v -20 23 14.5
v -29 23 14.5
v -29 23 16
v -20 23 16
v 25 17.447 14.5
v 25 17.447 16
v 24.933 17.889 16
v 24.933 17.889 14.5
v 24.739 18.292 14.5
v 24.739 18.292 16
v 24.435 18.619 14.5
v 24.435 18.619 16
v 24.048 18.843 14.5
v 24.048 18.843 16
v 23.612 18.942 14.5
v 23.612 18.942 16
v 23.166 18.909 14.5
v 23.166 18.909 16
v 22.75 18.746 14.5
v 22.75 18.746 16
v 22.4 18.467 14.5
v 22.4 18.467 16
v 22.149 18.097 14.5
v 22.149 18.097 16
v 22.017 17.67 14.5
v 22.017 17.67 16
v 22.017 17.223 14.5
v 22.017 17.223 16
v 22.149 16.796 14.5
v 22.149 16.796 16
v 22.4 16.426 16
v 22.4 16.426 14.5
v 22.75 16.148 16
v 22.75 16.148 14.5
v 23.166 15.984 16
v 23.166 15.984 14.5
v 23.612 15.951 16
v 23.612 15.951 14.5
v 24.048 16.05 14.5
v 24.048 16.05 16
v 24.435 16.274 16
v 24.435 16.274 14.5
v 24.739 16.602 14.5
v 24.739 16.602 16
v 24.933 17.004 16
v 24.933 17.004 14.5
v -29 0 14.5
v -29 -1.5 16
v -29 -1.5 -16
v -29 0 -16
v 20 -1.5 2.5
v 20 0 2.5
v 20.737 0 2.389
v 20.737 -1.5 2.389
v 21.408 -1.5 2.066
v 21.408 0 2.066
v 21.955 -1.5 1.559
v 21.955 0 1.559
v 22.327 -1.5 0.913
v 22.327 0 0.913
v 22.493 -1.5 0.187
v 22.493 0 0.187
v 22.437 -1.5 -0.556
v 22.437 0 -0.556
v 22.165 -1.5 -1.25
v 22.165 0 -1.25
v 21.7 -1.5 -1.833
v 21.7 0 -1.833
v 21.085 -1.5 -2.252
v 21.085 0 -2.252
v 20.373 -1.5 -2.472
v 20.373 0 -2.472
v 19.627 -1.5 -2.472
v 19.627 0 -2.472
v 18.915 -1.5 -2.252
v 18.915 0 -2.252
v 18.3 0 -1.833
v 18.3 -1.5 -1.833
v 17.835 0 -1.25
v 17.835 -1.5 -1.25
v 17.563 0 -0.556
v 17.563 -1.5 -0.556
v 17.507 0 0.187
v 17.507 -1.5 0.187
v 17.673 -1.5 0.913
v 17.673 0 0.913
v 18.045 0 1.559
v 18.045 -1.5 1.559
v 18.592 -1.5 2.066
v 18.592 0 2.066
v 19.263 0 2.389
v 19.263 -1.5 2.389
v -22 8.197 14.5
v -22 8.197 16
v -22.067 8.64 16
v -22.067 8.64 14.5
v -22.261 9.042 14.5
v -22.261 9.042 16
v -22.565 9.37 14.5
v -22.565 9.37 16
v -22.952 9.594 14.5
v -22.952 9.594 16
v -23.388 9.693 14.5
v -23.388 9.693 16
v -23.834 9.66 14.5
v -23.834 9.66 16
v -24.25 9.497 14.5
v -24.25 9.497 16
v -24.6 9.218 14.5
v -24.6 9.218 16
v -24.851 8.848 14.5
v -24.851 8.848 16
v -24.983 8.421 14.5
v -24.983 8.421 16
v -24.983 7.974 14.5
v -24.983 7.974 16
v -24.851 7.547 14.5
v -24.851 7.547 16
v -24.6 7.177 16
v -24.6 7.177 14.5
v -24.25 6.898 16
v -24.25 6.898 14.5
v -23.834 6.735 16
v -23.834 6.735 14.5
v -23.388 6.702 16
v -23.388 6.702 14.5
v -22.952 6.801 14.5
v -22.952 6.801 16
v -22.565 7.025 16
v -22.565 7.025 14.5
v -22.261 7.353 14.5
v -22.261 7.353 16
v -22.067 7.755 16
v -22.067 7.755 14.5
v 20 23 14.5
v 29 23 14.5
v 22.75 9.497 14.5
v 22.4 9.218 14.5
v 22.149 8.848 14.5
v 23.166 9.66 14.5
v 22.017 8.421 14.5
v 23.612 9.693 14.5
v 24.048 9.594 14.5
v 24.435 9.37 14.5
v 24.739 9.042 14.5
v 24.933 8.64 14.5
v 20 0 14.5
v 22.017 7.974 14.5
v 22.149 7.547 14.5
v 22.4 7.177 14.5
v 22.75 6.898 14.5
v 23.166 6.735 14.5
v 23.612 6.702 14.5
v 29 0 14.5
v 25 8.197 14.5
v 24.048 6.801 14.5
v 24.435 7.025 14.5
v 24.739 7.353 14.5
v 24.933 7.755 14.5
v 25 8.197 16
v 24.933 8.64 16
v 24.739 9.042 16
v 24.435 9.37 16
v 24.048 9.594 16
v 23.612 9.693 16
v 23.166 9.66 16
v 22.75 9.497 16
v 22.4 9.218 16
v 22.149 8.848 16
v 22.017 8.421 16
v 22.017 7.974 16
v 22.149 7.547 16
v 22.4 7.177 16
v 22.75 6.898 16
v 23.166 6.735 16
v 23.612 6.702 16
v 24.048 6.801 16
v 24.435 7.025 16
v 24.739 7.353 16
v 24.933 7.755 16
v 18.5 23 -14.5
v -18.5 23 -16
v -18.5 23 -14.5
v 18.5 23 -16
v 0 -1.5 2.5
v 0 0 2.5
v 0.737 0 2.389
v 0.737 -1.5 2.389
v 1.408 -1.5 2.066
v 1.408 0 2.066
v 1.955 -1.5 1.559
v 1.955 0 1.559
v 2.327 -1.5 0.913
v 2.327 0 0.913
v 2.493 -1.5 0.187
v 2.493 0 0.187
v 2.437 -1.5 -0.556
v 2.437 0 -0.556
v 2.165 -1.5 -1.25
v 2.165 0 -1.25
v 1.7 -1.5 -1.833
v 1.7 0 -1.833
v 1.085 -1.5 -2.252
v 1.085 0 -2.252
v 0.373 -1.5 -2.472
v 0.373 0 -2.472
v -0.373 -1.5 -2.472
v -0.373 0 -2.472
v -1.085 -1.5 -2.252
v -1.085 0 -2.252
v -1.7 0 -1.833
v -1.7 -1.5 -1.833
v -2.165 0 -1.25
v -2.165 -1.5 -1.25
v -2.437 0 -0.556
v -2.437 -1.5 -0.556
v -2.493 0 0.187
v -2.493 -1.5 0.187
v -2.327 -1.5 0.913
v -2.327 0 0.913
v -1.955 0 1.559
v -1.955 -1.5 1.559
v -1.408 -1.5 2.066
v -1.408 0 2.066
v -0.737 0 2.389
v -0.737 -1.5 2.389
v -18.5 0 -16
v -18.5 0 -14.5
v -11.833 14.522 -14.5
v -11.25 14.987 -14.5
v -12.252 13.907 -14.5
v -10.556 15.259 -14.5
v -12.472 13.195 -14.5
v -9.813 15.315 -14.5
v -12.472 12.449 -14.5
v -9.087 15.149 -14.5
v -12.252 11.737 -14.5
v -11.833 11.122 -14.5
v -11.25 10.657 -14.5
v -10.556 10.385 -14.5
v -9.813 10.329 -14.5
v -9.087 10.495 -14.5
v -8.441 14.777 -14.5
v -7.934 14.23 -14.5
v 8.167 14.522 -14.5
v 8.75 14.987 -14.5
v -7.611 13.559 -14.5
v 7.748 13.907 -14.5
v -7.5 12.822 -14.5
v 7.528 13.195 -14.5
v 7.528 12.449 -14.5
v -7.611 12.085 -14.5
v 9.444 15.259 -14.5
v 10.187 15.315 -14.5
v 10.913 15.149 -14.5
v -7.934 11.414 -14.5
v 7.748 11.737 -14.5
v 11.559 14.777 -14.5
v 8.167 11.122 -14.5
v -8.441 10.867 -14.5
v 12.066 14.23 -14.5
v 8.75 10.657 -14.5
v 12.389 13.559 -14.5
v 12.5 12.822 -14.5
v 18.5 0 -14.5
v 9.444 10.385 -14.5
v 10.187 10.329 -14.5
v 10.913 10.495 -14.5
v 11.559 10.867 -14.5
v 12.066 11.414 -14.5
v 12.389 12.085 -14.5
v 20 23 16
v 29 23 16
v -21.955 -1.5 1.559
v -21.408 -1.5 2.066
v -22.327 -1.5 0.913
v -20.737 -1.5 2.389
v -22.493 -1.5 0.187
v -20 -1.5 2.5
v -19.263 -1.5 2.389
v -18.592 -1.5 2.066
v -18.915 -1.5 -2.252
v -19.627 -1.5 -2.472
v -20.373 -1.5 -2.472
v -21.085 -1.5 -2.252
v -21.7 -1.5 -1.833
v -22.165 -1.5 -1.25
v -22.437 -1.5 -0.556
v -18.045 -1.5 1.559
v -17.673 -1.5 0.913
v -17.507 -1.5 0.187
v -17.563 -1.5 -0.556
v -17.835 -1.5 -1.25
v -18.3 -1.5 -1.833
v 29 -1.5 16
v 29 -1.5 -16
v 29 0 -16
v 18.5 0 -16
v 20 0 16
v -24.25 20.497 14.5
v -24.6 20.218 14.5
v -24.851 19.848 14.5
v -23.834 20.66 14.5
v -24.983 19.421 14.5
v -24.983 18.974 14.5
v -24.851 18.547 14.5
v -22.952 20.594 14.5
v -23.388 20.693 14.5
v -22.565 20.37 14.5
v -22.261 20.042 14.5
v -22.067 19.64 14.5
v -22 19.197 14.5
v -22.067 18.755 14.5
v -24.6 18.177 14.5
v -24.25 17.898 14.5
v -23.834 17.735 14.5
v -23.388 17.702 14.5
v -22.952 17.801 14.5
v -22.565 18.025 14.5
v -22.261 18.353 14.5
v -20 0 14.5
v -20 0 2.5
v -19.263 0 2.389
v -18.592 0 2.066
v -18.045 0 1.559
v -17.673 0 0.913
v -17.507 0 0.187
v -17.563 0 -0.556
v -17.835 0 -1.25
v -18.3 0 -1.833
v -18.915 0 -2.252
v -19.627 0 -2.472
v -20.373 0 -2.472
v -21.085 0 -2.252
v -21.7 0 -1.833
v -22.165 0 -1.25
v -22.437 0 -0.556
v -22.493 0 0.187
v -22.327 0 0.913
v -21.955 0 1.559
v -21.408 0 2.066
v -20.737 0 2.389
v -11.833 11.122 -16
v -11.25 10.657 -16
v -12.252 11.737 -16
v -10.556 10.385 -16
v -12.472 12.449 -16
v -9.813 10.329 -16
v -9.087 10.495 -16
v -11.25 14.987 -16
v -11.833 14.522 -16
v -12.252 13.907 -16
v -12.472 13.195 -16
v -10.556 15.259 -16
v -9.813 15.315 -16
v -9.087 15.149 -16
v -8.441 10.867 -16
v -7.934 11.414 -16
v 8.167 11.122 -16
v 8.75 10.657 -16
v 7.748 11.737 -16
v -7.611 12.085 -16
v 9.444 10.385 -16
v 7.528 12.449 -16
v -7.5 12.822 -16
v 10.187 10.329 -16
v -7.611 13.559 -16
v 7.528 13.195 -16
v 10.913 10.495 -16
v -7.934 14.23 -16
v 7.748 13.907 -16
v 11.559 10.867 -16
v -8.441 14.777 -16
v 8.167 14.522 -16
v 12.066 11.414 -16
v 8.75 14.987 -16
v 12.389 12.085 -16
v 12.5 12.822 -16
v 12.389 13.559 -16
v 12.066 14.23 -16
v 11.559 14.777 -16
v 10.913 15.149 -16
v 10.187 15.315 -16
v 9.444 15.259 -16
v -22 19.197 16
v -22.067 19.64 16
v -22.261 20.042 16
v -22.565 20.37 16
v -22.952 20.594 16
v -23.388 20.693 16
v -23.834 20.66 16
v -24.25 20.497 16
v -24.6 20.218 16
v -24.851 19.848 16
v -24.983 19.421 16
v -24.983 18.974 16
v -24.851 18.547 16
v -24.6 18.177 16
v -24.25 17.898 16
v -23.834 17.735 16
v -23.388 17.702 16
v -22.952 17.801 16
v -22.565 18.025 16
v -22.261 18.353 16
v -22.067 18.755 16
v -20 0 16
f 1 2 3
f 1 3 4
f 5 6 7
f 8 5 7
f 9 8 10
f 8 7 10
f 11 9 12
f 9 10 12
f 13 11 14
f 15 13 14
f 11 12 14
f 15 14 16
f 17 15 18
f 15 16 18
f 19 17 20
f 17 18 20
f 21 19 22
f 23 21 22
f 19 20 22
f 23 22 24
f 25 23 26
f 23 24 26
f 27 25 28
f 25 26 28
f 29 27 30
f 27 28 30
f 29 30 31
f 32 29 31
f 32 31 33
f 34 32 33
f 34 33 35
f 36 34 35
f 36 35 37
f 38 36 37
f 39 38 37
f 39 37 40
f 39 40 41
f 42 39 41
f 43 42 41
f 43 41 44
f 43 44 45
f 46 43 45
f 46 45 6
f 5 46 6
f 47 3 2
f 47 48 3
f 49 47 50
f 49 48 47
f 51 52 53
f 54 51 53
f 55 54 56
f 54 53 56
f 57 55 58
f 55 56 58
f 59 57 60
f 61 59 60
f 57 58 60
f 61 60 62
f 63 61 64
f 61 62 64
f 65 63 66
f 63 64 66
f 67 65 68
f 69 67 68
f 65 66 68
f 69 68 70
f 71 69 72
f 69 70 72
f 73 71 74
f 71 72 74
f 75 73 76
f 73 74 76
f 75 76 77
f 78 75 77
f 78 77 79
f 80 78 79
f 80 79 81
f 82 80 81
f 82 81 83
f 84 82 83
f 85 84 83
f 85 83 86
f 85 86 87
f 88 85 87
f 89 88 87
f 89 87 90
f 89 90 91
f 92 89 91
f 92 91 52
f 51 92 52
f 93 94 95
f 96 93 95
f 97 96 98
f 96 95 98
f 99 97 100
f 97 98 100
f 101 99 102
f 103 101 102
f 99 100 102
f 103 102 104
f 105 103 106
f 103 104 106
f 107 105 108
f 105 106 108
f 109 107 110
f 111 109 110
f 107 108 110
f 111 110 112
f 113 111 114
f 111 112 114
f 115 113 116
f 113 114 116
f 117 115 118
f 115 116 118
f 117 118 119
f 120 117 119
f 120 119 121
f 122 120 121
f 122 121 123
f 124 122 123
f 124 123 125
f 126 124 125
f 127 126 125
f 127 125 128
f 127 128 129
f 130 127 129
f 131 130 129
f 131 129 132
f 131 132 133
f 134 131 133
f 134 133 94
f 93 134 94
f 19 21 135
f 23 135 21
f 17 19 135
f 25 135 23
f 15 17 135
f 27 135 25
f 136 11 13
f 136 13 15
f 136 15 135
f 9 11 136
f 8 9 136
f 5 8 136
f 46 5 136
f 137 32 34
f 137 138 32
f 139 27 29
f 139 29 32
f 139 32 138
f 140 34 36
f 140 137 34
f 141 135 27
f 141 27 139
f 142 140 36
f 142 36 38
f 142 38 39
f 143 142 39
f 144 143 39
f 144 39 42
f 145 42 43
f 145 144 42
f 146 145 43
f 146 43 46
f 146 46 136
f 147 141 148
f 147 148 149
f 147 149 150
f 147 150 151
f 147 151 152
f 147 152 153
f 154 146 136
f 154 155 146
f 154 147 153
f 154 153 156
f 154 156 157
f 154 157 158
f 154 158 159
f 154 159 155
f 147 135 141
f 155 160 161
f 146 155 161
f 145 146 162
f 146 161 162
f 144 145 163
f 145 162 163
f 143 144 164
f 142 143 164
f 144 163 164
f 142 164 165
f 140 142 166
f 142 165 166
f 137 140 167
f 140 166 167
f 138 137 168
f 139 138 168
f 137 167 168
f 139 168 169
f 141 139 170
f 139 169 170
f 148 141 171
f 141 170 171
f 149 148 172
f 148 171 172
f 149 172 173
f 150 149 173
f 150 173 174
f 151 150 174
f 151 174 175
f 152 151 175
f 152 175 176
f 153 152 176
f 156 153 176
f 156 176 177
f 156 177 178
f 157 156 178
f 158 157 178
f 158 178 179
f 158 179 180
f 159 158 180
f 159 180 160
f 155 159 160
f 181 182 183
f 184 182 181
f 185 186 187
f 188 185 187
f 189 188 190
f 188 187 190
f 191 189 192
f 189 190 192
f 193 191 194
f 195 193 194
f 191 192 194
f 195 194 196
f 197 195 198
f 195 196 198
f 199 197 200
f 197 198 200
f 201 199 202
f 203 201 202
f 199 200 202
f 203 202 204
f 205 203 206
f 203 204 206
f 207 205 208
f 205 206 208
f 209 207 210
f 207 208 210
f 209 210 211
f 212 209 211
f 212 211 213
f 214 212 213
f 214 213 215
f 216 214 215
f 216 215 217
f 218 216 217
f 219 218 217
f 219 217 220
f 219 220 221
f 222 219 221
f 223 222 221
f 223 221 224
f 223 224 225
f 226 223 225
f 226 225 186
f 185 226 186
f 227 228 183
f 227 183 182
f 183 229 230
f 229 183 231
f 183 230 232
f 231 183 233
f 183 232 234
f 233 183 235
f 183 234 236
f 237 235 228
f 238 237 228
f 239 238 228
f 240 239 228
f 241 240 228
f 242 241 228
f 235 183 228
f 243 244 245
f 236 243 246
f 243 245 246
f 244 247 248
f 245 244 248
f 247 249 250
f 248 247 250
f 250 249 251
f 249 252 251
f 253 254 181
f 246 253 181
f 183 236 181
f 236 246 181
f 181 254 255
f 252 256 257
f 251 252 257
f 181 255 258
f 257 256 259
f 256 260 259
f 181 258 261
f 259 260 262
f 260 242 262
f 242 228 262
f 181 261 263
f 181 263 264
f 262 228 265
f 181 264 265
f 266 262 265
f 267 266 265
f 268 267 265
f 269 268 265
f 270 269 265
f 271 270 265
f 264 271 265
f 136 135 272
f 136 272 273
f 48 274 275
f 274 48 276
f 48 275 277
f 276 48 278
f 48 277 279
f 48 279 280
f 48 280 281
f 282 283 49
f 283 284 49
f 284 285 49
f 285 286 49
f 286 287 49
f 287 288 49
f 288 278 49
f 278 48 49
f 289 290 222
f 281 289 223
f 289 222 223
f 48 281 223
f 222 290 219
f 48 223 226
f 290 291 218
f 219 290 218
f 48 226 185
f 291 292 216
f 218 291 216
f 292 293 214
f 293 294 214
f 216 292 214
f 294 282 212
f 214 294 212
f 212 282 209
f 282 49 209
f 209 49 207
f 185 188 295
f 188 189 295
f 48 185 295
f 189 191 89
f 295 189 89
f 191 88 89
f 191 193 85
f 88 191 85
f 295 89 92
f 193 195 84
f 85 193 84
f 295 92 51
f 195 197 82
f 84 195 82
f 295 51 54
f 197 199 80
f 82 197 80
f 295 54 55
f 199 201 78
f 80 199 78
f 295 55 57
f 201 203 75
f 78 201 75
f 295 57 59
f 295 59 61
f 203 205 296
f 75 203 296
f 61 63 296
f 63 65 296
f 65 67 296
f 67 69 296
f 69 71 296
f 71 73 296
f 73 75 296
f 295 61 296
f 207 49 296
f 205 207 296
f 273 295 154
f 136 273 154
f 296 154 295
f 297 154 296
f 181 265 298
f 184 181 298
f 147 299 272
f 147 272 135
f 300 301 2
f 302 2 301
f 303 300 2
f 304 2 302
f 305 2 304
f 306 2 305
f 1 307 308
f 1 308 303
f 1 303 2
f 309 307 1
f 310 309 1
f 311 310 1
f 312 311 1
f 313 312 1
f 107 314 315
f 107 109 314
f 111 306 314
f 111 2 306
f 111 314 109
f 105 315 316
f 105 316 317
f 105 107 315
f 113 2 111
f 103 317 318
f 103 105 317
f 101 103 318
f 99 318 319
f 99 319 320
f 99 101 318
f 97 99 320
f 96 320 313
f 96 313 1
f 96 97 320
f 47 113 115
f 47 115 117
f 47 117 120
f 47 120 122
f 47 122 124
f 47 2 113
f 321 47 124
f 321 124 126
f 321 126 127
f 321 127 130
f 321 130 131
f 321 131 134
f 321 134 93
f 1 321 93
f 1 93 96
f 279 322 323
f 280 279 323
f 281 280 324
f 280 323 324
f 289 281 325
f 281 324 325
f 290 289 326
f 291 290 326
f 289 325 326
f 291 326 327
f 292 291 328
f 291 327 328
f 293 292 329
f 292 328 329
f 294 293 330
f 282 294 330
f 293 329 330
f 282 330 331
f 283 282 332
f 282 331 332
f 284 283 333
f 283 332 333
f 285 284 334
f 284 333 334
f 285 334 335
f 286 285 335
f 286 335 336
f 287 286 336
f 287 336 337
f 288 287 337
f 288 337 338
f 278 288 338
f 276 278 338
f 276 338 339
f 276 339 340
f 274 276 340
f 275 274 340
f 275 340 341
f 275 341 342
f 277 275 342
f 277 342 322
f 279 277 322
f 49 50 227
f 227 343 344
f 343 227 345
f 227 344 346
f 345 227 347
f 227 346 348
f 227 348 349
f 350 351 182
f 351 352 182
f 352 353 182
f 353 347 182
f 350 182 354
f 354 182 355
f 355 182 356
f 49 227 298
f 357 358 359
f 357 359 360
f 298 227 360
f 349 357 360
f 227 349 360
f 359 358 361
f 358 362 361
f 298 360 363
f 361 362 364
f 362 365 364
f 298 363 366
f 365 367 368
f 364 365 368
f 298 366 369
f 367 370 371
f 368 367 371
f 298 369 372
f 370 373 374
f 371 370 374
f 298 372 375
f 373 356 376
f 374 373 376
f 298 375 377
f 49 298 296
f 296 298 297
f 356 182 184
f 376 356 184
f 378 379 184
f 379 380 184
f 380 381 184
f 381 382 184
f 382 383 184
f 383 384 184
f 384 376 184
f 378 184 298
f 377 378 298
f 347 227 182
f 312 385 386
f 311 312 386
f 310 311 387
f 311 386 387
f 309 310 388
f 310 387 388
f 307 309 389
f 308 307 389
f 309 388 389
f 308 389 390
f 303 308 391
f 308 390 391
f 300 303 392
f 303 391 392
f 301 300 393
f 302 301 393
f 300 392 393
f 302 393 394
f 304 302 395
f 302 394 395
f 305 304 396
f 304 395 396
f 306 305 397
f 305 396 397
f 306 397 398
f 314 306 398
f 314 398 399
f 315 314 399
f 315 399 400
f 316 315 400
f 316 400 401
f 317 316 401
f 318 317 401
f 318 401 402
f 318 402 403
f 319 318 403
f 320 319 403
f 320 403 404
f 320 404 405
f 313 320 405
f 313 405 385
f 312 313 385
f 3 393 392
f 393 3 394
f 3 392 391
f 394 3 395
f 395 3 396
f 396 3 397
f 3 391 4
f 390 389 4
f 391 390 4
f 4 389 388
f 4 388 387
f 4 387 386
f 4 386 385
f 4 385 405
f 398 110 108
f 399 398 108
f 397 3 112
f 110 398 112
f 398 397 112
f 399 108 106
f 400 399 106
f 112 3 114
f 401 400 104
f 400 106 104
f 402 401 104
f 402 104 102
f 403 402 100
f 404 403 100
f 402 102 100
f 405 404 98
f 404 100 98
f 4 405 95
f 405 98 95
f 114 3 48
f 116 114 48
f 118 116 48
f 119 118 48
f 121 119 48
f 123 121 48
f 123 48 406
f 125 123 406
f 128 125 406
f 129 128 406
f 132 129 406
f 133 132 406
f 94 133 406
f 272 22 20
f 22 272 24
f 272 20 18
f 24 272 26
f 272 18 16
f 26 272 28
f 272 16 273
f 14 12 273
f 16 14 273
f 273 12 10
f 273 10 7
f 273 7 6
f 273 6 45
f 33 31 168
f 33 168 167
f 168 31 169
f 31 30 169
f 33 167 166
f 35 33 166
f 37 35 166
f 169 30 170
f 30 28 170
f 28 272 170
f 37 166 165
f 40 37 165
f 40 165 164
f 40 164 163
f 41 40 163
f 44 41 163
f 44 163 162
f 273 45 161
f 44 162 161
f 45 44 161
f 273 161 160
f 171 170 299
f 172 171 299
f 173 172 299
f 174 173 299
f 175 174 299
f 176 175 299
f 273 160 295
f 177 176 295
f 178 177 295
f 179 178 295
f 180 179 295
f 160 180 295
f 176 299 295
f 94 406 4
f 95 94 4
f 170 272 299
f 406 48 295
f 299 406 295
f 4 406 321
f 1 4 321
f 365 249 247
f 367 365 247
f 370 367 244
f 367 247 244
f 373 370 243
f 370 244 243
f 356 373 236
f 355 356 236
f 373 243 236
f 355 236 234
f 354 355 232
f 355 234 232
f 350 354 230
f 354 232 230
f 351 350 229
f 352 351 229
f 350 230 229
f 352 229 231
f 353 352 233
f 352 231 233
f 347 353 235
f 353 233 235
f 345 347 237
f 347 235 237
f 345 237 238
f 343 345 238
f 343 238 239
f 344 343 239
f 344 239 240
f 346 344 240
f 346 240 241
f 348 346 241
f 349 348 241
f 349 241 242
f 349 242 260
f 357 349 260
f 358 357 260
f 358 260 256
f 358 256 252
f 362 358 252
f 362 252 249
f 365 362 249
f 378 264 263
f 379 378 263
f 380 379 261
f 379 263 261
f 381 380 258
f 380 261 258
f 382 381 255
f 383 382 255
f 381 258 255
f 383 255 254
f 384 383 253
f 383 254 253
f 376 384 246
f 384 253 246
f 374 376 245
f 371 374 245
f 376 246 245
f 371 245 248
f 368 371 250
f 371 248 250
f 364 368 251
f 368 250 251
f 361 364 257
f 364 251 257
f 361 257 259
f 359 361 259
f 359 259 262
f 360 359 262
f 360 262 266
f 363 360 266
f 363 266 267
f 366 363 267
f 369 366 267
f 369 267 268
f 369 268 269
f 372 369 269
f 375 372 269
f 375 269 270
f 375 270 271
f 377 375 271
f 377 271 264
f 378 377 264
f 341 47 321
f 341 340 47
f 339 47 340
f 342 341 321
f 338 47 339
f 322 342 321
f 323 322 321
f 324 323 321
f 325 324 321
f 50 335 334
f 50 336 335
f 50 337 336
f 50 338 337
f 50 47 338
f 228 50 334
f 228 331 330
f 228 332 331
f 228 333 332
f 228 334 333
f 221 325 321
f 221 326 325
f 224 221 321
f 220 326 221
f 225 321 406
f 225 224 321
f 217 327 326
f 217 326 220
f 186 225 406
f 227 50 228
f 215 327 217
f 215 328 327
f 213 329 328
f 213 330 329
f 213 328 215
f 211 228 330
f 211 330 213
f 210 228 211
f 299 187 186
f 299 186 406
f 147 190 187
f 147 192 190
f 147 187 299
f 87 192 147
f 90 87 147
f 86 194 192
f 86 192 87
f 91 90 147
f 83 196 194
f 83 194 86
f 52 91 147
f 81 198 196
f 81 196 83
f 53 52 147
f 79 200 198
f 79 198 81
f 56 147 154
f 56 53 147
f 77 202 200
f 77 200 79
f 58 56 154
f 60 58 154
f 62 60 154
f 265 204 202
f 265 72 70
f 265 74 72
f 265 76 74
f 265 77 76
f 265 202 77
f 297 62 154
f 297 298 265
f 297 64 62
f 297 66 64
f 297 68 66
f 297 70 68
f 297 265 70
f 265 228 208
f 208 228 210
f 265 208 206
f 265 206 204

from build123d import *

# Parameters (mm, degrees)
SKETCH1_W           = 58
SKETCH1_H           = 32
BOSS_EXTRUDE1_DEPTH = 1.5
SKETCH1_3_W         = 9
SKETCH1_3_H         = 1.5
BOSS_EXTRUDE2_DEPTH = 23
SKETCH2_R           = 1.5
CUT_EXTRUDE1_DEPTH  = 49.928519291
SKETCH1_4_W         = 37
SKETCH1_4_H         = 1.5
BOSS_EXTRUDE3_DEPTH = 23
SKETCH3_R           = 2.5
CUT_EXTRUDE2_DEPTH  = 48.960921592
SKETCH1_5_R         = 2.5
CUT_EXTRUDE3_DEPTH  = 25


with BuildPart() as part:
    # Sketch1 → Boss-Extrude1 (new body)
    with BuildSketch(Plane(origin=(0, 0, 0), x_dir=(1, 0, 0), z_dir=(0, 1, 0))):
        Rectangle(SKETCH1_W, SKETCH1_H)
    extrude(amount=-BOSS_EXTRUDE1_DEPTH)

    # Sketch1<3> → Boss-Extrude2 (add)
    with BuildSketch(Plane(origin=(0, 0, 0), x_dir=(1, 0, 0), z_dir=(0, 1, 0))):
        with Locations((-24.5, -15.25)):
            Rectangle(SKETCH1_3_W, SKETCH1_3_H)
        with Locations((24.5, -15.25)):
            Rectangle(SKETCH1_3_W, SKETCH1_3_H)
    extrude(amount=BOSS_EXTRUDE2_DEPTH)

    # Sketch2 → Cut-Extrude1 (cut, through all)
    with BuildSketch(Plane.XY.offset(16)):
        with Locations((-23.5, 19.197487824)):
            Circle(SKETCH2_R)
        with Locations((-23.5, 8.197487824)):
            Circle(SKETCH2_R)
        with Locations((23.5, 17.446590768)):
            Circle(SKETCH2_R)
        with Locations((23.5, 8.197487824)):
            Circle(SKETCH2_R)
    extrude(amount=-CUT_EXTRUDE1_DEPTH, mode=Mode.SUBTRACT)

    # Sketch1<4> → Boss-Extrude3 (add)
    with BuildSketch(Plane(origin=(0, 0, 0), x_dir=(1, 0, 0), z_dir=(0, 1, 0))):
        with Locations((0, 15.25)):
            Rectangle(SKETCH1_4_W, SKETCH1_4_H)
    extrude(amount=BOSS_EXTRUDE3_DEPTH)

    # Sketch3 → Cut-Extrude2 (cut, through all)
    with BuildSketch(Plane.XY.offset(-14.5)):
        with Locations((10, 12.822039296)):
            Circle(SKETCH3_R)
        with Locations((-10, 12.822039296)):
            Circle(SKETCH3_R)
    extrude(amount=-CUT_EXTRUDE2_DEPTH, mode=Mode.SUBTRACT)

    # Sketch1<5> → Cut-Extrude3 (cut)
    with BuildSketch(Plane(origin=(0, 0, 0), x_dir=(1, 0, 0), z_dir=(0, 1, 0))):
        with Locations((-20, 0)):
            Circle(SKETCH1_5_R)
        with Locations((20, 0)):
            Circle(SKETCH1_5_R)
        Circle(SKETCH1_5_R)
    extrude(amount=-CUT_EXTRUDE3_DEPTH, mode=Mode.SUBTRACT)


solid = part.part
